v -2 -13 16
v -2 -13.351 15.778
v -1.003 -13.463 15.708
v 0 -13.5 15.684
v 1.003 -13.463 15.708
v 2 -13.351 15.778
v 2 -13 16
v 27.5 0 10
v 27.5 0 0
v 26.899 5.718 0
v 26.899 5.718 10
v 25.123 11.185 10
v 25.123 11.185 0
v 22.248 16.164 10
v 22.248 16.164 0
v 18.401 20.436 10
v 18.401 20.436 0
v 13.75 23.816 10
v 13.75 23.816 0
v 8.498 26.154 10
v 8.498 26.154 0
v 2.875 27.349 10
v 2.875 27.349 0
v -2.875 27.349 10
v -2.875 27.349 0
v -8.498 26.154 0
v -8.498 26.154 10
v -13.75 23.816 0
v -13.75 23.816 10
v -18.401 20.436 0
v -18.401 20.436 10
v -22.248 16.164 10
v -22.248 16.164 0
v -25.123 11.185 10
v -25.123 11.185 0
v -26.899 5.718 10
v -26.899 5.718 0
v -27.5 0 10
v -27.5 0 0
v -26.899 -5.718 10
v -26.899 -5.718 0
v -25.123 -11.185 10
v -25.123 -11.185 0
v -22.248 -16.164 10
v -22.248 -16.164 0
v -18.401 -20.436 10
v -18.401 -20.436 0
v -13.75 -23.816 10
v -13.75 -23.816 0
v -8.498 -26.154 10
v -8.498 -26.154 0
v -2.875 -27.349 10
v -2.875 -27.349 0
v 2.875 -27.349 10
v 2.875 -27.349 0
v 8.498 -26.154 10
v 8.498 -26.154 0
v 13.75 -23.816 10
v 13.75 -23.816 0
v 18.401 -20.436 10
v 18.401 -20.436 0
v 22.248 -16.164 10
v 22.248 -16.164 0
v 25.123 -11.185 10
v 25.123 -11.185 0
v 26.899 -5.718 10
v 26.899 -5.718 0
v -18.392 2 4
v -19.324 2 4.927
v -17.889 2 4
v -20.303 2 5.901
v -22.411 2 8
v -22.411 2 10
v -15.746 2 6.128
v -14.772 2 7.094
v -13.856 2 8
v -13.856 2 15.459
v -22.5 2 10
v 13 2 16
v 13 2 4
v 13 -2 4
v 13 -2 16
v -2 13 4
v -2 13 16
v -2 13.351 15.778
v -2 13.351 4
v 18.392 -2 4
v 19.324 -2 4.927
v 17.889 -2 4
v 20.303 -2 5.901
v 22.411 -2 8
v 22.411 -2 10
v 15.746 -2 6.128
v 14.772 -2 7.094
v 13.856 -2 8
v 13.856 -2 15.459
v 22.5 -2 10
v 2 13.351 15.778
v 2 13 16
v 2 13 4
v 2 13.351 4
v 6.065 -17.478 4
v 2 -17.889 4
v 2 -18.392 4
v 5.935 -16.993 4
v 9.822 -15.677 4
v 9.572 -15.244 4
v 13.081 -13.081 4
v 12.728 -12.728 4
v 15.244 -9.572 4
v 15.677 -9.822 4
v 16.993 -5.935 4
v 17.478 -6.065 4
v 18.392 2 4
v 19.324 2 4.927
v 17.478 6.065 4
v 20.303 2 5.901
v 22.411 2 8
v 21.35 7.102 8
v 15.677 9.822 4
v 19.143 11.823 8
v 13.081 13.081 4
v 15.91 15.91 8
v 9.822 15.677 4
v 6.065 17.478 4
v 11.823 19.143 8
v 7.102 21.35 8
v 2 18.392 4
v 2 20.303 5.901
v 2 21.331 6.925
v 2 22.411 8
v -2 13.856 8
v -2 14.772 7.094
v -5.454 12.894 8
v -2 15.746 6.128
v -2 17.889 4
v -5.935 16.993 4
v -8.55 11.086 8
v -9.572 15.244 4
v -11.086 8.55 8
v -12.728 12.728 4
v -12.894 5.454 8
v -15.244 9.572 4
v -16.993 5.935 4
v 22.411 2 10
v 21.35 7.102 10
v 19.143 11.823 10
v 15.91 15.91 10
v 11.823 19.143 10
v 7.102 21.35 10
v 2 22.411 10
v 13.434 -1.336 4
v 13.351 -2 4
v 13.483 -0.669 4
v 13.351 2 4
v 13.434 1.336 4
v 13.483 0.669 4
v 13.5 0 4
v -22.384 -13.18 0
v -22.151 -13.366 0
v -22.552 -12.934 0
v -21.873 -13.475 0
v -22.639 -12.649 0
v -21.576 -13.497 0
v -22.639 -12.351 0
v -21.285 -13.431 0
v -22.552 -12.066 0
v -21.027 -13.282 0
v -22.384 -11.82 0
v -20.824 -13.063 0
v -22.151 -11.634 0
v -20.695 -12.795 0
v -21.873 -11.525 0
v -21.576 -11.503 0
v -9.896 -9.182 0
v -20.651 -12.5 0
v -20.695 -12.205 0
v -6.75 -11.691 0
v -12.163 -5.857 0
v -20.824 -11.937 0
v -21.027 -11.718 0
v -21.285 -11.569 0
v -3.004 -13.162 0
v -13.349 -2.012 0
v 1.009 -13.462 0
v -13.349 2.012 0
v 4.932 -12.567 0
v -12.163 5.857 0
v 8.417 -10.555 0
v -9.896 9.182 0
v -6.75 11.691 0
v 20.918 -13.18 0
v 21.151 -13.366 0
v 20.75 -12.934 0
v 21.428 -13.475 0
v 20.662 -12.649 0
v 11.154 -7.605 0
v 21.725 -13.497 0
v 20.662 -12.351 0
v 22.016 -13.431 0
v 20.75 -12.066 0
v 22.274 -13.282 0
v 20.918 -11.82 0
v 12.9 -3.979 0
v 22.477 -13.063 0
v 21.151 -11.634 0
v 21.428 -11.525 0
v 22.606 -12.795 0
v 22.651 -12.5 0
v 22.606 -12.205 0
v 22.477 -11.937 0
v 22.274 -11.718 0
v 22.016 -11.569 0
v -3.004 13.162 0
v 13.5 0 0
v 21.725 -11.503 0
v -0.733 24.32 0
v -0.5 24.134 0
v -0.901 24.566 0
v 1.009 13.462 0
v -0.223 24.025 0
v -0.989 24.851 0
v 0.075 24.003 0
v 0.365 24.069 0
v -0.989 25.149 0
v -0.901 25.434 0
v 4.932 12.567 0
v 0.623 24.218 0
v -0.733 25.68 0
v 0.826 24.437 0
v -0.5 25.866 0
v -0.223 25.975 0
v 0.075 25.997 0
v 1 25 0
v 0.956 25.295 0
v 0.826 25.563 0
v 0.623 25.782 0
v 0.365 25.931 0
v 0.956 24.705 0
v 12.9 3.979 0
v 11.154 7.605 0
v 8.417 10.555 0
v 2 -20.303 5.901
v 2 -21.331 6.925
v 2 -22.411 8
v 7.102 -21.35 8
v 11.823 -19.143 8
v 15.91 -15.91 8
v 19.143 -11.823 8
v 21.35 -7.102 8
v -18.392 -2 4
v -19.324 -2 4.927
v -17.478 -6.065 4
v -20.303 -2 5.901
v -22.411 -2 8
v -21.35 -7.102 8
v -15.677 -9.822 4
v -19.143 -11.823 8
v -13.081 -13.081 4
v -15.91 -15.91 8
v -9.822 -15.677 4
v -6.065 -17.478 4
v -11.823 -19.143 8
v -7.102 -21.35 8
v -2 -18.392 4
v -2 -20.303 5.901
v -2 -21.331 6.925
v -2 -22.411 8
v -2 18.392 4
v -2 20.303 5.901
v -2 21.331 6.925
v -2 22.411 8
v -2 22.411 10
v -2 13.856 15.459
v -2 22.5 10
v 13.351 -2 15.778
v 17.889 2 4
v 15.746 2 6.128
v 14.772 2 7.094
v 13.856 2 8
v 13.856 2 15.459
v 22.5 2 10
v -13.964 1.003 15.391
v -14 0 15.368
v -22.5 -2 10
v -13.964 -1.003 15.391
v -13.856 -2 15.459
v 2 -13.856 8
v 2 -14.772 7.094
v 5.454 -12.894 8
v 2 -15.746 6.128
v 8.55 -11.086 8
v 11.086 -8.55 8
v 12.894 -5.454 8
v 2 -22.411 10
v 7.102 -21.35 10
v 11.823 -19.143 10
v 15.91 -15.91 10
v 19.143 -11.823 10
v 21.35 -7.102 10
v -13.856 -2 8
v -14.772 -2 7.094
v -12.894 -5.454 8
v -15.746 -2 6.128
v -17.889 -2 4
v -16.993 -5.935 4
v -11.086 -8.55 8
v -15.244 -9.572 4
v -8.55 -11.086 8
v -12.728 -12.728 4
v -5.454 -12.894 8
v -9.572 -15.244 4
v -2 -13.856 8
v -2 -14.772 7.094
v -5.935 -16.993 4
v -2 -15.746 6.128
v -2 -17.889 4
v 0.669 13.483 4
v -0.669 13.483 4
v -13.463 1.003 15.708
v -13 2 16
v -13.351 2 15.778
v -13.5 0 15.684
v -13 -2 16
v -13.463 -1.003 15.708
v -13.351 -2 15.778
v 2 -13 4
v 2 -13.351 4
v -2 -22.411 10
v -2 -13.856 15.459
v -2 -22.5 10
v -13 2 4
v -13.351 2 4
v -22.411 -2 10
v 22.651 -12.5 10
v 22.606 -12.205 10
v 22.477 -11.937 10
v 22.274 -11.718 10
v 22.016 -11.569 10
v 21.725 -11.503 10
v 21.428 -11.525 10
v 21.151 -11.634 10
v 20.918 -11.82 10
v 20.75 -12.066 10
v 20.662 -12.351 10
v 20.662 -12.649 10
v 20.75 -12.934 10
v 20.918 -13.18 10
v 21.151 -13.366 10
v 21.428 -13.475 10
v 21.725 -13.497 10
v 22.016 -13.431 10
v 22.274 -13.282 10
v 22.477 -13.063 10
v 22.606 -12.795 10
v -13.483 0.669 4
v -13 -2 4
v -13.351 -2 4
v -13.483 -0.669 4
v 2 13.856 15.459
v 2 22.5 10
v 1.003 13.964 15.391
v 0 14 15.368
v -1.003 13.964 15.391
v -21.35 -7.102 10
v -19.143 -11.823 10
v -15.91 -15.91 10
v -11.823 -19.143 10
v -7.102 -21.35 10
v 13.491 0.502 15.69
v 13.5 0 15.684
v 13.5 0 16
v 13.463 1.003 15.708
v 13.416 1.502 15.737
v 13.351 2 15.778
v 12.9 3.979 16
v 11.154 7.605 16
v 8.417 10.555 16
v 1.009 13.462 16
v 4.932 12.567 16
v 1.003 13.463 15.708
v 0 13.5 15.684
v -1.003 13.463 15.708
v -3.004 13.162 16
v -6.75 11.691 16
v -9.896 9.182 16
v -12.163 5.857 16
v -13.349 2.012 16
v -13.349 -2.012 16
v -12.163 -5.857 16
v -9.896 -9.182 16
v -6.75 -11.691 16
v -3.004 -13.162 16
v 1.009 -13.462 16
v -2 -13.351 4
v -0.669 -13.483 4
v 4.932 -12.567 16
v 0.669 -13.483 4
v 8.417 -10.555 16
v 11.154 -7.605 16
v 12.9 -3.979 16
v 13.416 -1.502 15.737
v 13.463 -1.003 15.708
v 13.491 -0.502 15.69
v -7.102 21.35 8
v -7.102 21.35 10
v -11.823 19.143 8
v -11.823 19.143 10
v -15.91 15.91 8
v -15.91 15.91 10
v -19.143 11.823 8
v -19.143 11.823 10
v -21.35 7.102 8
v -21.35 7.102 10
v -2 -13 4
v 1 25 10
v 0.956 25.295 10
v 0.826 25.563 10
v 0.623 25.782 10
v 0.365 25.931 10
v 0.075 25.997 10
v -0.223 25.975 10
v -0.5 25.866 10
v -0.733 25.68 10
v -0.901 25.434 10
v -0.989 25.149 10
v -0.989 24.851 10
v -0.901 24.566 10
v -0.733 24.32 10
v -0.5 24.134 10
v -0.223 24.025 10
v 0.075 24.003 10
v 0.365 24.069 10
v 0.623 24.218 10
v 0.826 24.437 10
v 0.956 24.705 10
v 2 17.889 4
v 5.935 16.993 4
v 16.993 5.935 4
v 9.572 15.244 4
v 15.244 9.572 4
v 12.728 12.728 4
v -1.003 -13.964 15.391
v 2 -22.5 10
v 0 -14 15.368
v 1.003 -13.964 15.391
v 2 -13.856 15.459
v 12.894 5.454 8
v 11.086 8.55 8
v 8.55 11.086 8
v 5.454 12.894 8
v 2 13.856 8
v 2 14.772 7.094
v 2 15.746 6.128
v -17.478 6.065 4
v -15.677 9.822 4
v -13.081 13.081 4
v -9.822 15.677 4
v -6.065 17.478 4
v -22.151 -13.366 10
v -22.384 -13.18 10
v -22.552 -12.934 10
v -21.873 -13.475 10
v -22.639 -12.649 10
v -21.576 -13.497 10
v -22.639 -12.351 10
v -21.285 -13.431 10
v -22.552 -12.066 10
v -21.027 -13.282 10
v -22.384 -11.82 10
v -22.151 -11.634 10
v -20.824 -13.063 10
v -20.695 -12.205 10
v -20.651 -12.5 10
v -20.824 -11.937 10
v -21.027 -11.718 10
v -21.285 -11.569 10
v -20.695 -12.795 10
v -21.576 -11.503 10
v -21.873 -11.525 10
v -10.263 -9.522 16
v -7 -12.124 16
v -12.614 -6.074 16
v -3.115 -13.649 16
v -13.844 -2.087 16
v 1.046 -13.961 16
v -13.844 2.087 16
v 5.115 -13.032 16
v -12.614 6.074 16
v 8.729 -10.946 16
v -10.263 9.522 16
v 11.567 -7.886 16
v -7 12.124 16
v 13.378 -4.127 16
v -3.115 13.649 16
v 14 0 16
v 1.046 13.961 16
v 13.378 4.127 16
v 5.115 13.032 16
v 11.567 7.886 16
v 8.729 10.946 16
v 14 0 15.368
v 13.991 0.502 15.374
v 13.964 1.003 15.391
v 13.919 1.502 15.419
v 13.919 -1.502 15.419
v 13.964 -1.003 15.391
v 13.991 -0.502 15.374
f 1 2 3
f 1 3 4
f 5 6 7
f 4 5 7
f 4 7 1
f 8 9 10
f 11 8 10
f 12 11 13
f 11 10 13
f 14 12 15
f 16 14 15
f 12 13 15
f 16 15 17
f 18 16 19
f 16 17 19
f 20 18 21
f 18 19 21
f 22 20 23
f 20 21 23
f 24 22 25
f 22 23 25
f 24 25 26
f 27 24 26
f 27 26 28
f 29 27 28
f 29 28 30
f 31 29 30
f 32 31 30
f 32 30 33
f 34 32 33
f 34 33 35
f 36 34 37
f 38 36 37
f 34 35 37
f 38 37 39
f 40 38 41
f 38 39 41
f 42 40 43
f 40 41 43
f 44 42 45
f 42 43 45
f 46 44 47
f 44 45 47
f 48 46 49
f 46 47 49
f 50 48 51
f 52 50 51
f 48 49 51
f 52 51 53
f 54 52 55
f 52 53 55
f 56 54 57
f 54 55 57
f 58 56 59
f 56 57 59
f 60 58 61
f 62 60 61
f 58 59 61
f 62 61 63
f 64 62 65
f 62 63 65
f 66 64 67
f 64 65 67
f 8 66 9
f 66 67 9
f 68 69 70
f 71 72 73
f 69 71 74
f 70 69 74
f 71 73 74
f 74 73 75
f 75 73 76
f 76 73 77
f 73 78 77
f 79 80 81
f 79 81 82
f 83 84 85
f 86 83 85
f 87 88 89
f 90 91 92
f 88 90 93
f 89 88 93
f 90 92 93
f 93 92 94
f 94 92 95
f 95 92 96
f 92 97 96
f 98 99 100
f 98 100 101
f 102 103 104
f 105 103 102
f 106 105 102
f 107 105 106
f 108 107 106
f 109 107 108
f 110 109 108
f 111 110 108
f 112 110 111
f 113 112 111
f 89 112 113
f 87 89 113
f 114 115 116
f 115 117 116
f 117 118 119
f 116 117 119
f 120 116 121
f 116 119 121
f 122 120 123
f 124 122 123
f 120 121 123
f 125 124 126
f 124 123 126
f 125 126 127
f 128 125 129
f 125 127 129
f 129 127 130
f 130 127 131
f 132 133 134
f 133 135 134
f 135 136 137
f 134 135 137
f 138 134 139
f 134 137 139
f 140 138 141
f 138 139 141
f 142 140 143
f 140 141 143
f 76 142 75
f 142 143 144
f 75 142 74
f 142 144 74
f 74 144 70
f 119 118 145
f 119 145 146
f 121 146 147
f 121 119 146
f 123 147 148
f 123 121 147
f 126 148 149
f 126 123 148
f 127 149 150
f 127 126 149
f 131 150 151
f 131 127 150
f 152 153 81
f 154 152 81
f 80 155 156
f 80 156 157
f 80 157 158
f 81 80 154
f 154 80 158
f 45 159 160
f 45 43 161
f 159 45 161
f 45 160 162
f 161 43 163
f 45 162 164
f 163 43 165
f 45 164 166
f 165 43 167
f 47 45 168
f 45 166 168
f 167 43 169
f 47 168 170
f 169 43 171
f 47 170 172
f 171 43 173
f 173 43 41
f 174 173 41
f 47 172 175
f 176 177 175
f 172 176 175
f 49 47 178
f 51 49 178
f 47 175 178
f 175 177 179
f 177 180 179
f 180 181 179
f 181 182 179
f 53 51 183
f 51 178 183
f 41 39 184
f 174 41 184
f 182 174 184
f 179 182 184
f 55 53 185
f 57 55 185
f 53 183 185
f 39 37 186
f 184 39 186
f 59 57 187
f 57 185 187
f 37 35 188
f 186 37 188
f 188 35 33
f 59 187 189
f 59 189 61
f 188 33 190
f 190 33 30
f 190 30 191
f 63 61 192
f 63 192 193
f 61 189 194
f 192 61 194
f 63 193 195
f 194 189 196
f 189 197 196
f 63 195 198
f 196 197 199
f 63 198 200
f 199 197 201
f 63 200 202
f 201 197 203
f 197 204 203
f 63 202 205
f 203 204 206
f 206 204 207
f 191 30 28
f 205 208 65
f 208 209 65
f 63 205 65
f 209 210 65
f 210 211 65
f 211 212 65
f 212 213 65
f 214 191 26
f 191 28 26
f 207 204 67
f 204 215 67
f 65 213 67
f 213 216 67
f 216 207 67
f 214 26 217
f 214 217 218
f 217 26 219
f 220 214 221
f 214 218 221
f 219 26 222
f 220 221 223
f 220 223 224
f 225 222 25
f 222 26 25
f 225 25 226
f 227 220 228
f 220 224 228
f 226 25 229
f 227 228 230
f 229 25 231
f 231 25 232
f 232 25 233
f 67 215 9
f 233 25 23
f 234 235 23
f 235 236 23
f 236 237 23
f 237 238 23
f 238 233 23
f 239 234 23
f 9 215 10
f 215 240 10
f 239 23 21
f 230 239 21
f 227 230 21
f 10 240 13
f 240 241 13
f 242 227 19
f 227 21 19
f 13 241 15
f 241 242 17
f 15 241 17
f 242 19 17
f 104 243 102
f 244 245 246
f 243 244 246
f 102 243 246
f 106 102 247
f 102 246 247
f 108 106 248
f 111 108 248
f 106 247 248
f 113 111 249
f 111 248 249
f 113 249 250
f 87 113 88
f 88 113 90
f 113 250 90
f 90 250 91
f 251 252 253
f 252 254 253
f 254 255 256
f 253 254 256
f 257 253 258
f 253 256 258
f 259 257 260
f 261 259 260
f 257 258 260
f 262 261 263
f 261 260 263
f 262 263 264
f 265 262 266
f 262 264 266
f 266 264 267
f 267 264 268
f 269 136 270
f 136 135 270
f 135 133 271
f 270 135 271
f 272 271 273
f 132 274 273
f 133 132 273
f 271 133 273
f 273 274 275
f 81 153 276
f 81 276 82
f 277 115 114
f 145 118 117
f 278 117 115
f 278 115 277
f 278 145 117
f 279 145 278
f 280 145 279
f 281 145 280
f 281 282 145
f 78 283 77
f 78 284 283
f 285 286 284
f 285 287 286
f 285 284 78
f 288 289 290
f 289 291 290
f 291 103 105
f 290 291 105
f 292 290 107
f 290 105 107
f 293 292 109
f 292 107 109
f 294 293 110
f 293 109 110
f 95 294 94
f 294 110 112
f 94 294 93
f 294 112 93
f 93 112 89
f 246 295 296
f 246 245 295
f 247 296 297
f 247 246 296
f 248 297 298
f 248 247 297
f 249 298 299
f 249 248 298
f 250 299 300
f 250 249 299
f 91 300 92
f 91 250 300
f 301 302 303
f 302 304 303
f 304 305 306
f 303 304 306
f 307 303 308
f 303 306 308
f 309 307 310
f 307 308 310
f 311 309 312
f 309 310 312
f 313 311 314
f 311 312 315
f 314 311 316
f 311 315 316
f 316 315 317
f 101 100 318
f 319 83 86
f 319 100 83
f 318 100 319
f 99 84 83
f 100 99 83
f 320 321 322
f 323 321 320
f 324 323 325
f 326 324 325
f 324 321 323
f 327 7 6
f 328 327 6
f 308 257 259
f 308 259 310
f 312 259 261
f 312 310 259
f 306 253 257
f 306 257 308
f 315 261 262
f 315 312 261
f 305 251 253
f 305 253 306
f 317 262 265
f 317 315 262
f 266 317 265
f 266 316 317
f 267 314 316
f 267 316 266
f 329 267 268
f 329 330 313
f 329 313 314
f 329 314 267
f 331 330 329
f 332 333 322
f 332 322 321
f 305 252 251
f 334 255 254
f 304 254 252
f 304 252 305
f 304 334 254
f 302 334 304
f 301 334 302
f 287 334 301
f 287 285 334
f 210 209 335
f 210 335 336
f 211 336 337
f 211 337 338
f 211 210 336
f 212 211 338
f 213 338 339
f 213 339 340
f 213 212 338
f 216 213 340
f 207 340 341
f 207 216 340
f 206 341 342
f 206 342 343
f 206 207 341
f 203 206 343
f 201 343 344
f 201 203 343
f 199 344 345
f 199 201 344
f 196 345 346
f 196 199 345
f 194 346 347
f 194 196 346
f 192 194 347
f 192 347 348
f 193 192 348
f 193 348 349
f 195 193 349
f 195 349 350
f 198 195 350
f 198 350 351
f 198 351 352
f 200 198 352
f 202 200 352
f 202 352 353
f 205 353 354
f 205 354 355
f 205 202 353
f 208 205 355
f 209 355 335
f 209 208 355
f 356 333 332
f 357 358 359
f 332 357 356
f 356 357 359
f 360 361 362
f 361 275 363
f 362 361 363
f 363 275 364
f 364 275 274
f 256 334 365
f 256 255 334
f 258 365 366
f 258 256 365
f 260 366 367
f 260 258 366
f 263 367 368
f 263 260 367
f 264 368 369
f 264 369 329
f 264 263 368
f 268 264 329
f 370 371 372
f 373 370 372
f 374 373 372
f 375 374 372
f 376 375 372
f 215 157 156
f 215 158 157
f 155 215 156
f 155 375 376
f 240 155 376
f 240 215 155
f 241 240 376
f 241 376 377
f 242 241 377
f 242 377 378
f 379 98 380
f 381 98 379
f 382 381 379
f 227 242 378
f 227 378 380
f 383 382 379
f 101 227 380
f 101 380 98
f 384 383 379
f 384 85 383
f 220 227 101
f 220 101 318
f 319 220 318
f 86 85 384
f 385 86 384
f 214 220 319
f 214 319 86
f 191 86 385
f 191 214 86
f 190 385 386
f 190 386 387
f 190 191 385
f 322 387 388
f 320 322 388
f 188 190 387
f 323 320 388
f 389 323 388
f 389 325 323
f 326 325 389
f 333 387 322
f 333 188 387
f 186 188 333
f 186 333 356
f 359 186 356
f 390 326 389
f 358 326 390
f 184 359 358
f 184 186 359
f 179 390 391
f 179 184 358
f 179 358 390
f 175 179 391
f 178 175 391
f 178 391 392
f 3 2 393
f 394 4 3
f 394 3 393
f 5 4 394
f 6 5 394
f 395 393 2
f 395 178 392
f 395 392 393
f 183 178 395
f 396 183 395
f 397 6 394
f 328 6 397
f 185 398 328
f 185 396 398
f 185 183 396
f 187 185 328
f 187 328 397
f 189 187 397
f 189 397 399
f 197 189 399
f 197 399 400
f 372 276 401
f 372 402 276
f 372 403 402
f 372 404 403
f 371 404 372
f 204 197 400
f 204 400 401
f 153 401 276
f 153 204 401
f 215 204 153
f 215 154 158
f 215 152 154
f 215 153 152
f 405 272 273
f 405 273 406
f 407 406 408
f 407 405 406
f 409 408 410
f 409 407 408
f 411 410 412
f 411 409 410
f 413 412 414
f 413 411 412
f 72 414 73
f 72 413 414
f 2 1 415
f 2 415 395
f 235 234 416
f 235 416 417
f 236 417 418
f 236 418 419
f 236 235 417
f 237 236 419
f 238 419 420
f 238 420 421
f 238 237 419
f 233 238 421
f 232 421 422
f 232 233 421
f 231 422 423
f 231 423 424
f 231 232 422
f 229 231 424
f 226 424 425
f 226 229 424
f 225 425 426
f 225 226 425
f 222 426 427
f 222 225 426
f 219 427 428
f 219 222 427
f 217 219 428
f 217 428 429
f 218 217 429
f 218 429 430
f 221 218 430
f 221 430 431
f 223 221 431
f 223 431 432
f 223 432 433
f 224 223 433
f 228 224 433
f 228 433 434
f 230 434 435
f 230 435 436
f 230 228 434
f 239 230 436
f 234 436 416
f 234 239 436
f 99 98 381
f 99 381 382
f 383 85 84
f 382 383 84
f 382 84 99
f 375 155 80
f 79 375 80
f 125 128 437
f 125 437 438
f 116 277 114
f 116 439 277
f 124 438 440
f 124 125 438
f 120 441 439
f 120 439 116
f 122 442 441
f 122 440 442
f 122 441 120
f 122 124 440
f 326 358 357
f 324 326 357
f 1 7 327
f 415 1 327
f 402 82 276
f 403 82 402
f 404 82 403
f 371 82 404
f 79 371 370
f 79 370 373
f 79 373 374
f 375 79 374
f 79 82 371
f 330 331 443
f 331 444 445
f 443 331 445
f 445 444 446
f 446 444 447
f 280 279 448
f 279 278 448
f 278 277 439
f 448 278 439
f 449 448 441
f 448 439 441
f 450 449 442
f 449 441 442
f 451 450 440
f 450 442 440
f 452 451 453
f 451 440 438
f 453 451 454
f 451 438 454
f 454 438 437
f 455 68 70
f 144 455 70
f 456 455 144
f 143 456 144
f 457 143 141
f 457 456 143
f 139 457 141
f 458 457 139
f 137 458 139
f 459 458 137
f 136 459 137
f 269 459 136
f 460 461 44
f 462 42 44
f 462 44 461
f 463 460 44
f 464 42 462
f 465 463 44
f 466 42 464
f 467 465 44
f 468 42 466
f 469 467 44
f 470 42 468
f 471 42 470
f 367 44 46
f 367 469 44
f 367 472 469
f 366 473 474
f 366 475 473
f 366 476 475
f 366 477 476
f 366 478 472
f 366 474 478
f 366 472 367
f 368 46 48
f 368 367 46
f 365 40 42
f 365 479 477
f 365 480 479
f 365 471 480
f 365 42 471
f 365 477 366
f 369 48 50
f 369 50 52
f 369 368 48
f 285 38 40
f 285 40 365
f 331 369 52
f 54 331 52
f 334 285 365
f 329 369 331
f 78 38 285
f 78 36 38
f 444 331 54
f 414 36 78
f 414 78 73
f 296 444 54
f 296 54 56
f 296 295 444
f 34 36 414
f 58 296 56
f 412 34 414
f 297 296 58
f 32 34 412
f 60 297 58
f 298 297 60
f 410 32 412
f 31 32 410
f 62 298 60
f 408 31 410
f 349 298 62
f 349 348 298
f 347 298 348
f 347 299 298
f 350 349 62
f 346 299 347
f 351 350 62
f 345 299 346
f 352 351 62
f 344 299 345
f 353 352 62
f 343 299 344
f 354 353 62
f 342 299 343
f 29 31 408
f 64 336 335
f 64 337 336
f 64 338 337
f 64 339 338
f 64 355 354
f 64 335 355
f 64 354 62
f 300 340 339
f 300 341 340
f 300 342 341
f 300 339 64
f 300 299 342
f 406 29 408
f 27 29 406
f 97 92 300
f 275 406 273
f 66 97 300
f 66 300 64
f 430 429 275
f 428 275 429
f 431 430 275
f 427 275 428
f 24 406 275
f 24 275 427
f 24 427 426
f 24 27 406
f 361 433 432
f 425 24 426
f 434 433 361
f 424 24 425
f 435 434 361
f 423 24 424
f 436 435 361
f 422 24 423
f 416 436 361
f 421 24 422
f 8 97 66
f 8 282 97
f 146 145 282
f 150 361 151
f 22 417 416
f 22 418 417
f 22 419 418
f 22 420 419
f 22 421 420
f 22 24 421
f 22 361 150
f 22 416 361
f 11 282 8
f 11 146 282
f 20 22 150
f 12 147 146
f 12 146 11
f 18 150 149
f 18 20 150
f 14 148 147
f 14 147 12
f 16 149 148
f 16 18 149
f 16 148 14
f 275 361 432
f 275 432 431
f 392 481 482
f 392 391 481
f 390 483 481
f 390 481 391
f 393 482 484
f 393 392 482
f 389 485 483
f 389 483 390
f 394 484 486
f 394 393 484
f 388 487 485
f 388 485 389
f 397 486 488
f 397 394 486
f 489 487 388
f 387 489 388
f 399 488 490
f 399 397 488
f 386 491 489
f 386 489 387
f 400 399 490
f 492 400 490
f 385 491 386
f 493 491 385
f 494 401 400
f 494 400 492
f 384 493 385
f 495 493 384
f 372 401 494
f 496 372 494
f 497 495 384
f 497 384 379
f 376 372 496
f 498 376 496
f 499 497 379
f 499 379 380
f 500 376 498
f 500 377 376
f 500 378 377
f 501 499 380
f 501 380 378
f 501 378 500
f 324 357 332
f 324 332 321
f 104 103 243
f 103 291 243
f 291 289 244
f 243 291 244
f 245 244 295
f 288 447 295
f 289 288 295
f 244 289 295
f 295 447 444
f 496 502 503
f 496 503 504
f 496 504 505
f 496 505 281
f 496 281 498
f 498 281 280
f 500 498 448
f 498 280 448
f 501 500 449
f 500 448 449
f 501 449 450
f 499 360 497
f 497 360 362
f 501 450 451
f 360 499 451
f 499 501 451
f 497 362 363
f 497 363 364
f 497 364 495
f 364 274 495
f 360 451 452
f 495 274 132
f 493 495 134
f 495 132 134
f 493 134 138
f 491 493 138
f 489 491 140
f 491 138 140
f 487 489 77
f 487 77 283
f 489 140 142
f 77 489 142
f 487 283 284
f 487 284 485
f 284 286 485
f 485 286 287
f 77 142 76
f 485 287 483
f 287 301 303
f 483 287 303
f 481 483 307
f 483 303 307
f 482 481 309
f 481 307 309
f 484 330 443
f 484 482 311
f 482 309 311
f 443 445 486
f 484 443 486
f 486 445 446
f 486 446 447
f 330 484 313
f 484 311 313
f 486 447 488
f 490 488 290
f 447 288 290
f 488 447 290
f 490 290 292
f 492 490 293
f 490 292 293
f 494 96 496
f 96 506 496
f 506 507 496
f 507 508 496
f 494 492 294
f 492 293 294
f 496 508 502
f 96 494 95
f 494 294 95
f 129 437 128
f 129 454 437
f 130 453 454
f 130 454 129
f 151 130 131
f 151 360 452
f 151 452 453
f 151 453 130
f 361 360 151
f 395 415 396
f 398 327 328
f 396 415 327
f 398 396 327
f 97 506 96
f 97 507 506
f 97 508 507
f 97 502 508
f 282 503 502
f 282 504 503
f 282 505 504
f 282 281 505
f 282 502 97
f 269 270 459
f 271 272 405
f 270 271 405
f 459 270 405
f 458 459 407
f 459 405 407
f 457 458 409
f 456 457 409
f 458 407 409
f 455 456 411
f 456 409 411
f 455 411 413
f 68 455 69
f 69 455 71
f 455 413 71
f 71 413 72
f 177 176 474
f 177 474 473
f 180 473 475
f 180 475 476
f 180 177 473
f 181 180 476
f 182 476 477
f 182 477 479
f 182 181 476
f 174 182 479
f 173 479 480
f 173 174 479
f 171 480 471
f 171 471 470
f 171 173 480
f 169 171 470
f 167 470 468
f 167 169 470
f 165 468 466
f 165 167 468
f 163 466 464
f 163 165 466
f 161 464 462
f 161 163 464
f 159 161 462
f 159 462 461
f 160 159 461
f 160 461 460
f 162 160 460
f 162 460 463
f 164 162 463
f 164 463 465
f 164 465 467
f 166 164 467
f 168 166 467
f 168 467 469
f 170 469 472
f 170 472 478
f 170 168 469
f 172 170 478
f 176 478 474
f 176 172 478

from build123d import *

# Parameters (mm, degrees)
SKETCH_R        = 27.5
SKETCH_R_2      = 22.5
SKETCH_R_3      = 1
PAD_DEPTH       = 10
SKETCH001_R     = 22.5
SKETCH001_R_2   = 14
PAD001_DEPTH    = 4
CHAMFER_SIZE    = 4
PAD002_DEPTH    = 2
PAD003_DEPTH    = 2
SKETCH004_R     = 14
SKETCH004_R_2   = 13.5
PAD004_DEPTH    = 16
CHAMFER001_SIZE = 4


with BuildPart() as part:
    # Sketch → Pad (new body)
    with BuildSketch(Plane.XY):
        Circle(SKETCH_R)
        Circle(SKETCH_R_2, mode=Mode.SUBTRACT)
        with Locations((0, 25)):
            Circle(SKETCH_R_3, mode=Mode.SUBTRACT)
        with Locations((-21.650635, -12.5)):
            Circle(SKETCH_R_3, mode=Mode.SUBTRACT)
        with Locations((21.650635, -12.5)):
            Circle(SKETCH_R_3, mode=Mode.SUBTRACT)
    extrude(amount=PAD_DEPTH)

    # Sketch001 → Pad001 (join)
    with BuildSketch(Plane.XY):
        Circle(SKETCH001_R)
        Circle(SKETCH001_R_2, mode=Mode.SUBTRACT)
    extrude(amount=PAD001_DEPTH)

    # Chamfer
    chamfer_edges = [part.edges().sort_by_distance(p)[0] for p in [
        (-22.5, 0, 4),
    ]]
    chamfer(chamfer_edges, length=CHAMFER_SIZE)

    # Sketch002 → Pad002 (join, symmetric)
    with BuildSketch(Plane.XZ):
        Polygon((22.5, 10), (22.5, 4), (13, 4), (13, 16), align=None)
        Polygon((-22.5, 10), (-22.5, 4), (-13, 4), (-13, 16), align=None)
    extrude(amount=PAD002_DEPTH, both=True)

    # Sketch003 → Pad003 (join, symmetric)
    with BuildSketch(Plane.YZ):
        Polygon((13, 4), (22.5, 4), (22.5, 10), (13, 16), align=None)
        Polygon((-13, 4), (-22.5, 4), (-22.5, 10), (-13, 16), align=None)
    extrude(amount=PAD003_DEPTH, both=True)

    # Sketch004 → Pad004 (join)
    with BuildSketch(Plane.XY):
        Circle(SKETCH004_R)
        Circle(SKETCH004_R_2, mode=Mode.SUBTRACT)
    extrude(amount=PAD004_DEPTH)

    # Chamfer001
    chamfer001_edges = [part.edges().sort_by_distance(p)[0] for p in [
        (9.899495, 9.899495, 4),
        (9.899495, -9.899495, 4),
        (-9.899495, -9.899495, 4),
        (-9.899495, 9.899495, 4),
    ]]
    chamfer(chamfer001_edges, length=CHAMFER001_SIZE)


solid = part.part
